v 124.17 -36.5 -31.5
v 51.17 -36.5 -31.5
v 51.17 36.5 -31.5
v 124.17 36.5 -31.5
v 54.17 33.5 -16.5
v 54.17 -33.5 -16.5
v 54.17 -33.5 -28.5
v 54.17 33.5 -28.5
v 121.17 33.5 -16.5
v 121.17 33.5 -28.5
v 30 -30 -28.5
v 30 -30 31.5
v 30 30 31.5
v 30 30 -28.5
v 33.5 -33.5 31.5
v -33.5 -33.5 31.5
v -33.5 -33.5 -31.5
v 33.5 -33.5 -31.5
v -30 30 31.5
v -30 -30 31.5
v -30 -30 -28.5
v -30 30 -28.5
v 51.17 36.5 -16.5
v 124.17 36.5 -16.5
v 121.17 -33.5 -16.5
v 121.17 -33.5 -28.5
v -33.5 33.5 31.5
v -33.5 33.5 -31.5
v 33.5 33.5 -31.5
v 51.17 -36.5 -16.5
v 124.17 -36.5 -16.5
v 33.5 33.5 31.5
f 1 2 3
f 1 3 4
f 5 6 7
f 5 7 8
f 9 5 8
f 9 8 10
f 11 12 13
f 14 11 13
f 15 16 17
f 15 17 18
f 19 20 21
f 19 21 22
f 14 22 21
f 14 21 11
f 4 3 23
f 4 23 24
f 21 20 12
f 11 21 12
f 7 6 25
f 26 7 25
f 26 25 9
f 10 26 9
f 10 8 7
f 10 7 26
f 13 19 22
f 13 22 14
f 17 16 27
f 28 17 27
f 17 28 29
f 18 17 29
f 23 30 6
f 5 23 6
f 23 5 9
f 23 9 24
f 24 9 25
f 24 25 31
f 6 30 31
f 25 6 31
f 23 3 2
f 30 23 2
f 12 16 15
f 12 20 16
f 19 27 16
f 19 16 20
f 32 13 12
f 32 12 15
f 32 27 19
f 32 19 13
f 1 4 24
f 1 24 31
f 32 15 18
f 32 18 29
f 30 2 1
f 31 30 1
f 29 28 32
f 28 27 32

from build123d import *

# Parameters (mm, degrees)
F0_W     = 67
F0_H     = 67
F1_DEPTH = 31.5
F2_W     = 60
F2_H     = 60
F3_DEPTH = 60
F4_W     = 73
F4_H     = 73
F5_DEPTH = 15
F6_W     = 67
F6_H     = 67
F7_DEPTH = 12


with BuildPart() as f1:
    # F0 (on Top) → F1 (new body, symmetric)
    with BuildSketch(Plane.XY):
        Rectangle(F0_W, F0_H)
    extrude(amount=F1_DEPTH, both=True)

    # F2 (on face) → F3 (cut)
    with BuildSketch(Plane.XY.offset(31.5)):
        Rectangle(F2_W, F2_H)
    extrude(amount=-F3_DEPTH, mode=Mode.SUBTRACT)


with BuildPart() as f5:
    # F4 (on face) → F5 (new body)
    with BuildSketch(Plane(origin=(0, 0, -31.5), x_dir=(1, 0, 0), z_dir=(0, 0, -1))):
        with Locations((87.669559, 0)):
            Rectangle(F4_W, F4_H)
    extrude(amount=-F5_DEPTH)

    # F6 (on face) → F7 (cut)
    with BuildSketch(Plane.XY.offset(-16.5)):
        with Locations((87.669559, 0)):
            Rectangle(F6_W, F6_H)
    extrude(amount=-F7_DEPTH, mode=Mode.SUBTRACT)


solid = Compound([f1.part, f5.part])
